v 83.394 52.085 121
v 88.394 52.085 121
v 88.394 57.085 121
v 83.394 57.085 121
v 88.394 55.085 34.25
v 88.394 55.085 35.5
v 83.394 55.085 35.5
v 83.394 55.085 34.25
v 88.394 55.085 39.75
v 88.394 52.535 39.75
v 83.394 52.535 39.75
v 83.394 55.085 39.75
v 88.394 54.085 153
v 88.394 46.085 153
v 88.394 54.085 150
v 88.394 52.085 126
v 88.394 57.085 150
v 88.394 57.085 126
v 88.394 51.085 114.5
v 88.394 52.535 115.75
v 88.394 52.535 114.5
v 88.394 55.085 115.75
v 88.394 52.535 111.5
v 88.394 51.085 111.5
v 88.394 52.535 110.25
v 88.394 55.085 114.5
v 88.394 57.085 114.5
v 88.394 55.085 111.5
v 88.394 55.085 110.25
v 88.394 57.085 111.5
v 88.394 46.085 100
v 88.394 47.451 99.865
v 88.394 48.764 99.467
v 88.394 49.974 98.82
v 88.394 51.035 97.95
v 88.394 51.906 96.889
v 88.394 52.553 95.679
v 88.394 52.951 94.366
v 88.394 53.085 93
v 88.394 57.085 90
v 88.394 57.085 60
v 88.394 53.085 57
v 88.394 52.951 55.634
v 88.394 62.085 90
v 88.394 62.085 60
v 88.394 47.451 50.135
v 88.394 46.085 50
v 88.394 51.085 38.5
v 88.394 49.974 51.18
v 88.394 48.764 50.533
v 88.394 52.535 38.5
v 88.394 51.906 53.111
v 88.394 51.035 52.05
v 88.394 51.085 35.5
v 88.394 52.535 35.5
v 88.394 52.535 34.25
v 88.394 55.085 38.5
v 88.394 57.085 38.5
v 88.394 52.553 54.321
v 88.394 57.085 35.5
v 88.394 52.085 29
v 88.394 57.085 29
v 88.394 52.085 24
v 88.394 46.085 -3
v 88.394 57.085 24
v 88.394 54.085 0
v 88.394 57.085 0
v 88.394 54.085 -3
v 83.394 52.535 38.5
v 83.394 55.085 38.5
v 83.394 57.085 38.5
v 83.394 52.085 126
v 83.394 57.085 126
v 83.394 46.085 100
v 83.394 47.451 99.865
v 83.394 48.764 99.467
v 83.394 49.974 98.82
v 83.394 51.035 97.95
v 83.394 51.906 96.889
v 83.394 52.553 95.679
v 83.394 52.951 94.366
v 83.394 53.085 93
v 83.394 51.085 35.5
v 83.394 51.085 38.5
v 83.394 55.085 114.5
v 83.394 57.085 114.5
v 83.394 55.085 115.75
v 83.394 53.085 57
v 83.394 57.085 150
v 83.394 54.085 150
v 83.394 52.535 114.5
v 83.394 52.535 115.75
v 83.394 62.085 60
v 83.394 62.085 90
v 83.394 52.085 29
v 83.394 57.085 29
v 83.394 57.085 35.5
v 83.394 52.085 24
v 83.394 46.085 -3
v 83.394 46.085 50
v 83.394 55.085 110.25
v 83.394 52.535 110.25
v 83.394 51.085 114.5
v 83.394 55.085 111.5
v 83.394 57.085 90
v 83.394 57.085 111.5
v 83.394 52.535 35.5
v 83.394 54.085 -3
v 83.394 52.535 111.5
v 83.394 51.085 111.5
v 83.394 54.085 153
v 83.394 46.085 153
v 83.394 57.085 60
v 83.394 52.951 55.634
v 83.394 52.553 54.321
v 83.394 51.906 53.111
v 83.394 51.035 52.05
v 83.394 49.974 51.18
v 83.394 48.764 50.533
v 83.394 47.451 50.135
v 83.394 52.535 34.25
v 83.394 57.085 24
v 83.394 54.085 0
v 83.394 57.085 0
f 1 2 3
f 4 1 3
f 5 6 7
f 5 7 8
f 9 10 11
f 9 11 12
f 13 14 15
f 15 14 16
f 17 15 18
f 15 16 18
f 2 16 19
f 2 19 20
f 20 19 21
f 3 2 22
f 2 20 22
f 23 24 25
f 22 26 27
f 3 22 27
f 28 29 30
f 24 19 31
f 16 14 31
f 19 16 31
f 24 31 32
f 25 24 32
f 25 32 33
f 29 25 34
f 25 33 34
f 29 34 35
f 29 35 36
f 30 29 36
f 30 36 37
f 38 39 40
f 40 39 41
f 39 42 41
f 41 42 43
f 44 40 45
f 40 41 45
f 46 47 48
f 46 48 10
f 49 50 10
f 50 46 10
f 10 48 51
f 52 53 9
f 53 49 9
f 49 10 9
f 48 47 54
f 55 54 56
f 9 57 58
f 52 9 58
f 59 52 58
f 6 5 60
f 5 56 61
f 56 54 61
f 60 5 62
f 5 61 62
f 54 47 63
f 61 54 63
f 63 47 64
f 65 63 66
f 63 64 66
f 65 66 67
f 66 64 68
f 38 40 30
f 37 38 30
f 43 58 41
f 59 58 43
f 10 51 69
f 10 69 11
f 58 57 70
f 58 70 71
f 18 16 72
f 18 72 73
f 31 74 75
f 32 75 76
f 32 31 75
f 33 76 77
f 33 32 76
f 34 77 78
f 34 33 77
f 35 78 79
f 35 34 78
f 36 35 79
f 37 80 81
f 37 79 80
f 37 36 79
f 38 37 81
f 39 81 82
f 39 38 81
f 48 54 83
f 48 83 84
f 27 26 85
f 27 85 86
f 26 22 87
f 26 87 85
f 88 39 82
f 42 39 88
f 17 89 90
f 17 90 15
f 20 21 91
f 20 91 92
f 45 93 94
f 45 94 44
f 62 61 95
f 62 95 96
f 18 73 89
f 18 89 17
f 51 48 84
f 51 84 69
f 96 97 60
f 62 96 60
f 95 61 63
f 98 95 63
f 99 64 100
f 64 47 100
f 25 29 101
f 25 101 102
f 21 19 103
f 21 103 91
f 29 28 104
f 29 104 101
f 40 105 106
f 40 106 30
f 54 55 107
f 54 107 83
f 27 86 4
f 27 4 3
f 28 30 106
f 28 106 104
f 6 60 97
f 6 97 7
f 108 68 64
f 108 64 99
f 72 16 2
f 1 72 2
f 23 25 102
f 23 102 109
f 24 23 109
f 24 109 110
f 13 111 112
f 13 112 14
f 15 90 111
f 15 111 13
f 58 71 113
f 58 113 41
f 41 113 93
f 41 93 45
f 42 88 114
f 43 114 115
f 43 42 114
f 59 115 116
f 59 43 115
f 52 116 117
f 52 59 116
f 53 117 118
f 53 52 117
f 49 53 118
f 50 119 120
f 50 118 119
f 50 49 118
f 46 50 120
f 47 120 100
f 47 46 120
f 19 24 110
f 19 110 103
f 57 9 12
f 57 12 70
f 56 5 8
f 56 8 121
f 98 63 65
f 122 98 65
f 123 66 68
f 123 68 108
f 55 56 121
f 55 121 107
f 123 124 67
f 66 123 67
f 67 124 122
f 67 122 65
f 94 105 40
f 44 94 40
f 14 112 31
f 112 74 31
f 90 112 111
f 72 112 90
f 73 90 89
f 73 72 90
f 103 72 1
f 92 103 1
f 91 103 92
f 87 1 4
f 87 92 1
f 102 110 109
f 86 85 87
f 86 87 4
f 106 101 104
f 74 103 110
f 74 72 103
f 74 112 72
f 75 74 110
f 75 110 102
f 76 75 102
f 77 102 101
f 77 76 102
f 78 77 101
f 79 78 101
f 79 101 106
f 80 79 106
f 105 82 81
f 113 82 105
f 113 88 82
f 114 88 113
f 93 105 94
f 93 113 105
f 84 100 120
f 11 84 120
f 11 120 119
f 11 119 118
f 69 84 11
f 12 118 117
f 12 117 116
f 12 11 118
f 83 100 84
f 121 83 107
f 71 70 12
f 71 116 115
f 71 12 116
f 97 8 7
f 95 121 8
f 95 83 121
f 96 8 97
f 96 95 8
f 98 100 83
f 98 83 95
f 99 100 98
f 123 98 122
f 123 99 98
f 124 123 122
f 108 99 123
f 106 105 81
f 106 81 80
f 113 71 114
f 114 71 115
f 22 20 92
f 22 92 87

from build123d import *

# Parameters (mm, degrees)
SKETCH1_W           = 5
SKETCH1_H           = 11
BOSS_EXTRUDE1_DEPTH = 150
CUT_EXTRUDE1_DEPTH  = 161.573187019
SKETCH3_W           = 5
SKETCH3_H           = 30
BOSS_EXTRUDE2_DEPTH = 5
CUT_EXTRUDE2_DEPTH  = 163.417988138
SKETCH6_W           = 5
SKETCH6_H           = 8
BOSS_EXTRUDE3_DEPTH = 3
SKETCH7_W           = 5
SKETCH7_H           = 8
BOSS_EXTRUDE4_DEPTH = 3
SKETCH8_W           = 5
SKETCH8_H           = 5
CUT_EXTRUDE3_DEPTH  = 166.192623536


with BuildPart() as part:
    # Sketch1 → Boss-Extrude1 (new body)
    with BuildSketch(Plane.XY):
        with Locations((85.894042166, 51.58544814)):
            Rectangle(SKETCH1_W, SKETCH1_H)
    extrude(amount=BOSS_EXTRUDE1_DEPTH)

    # Sketch2 → Cut-Extrude1 (cut, through all)
    with BuildSketch(Plane(origin=(88.394042166, 0, 0), x_dir=(0, 0, -1), z_dir=(1, 0, 0))):
        with BuildLine():
            Line((-93, 53.08544814), (-57, 53.08544814))
            ThreePointArc((-57, 53.08544814), (-52.050252532, 51.035195608), (-50, 46.08544814))
            Line((-50, 46.08544814), (-100, 46.08544814))
            ThreePointArc((-100, 46.08544814), (-97.949747468, 51.035195608), (-93, 53.08544814))
        make_face()
    extrude(amount=-CUT_EXTRUDE1_DEPTH, mode=Mode.SUBTRACT)

    # Sketch3 → Boss-Extrude2 (add)
    with BuildSketch(Plane(origin=(0, 57.08544814, 0), x_dir=(1, 0, 0), z_dir=(0, 1, 0))):
        with Locations((85.894042166, -75)):
            Rectangle(SKETCH3_W, SKETCH3_H)
    extrude(amount=BOSS_EXTRUDE2_DEPTH)

    # Sketch5 → Cut-Extrude2 (cut, through all)
    with BuildSketch(Plane(origin=(88.394042166, 0, 0), x_dir=(0, 0, -1), z_dir=(1, 0, 0))):
        Polygon((-35.5, 55.08544814), (-34.25, 55.08544814), (-34.25, 52.53544814), (-35.5, 52.53544814), (-35.5, 51.08544814), (-38.5, 51.08544814), (-38.5, 52.53544814), (-39.75, 52.53544814), (-39.75, 55.08544814), (-38.5, 55.08544814), (-38.5, 57.08544814), (-35.5, 57.08544814), align=None)
        Polygon((-114.5, 52.53544814), (-115.75, 52.53544814), (-115.75, 55.08544814), (-114.5, 55.08544814), (-114.5, 57.08544814), (-111.5, 57.08544814), (-111.5, 55.08544814), (-110.25, 55.08544814), (-110.25, 52.53544814), (-111.5, 52.53544814), (-111.5, 51.08544814), (-114.5, 51.08544814), align=None)
    extrude(amount=-CUT_EXTRUDE2_DEPTH, mode=Mode.SUBTRACT)

    # Sketch6 → Boss-Extrude3 (add)
    with BuildSketch(Plane(origin=(0, 0, 0), x_dir=(-1, 0, 0), z_dir=(0, 0, -1))):
        with Locations((-85.894042166, 50.08544814)):
            Rectangle(SKETCH6_W, SKETCH6_H)
    extrude(amount=BOSS_EXTRUDE3_DEPTH)

    # Sketch7 → Boss-Extrude4 (add)
    with BuildSketch(Plane.XY.offset(150)):
        with Locations((85.894042166, 50.08544814)):
            Rectangle(SKETCH7_W, SKETCH7_H)
    extrude(amount=BOSS_EXTRUDE4_DEPTH)

    # Sketch8 → Cut-Extrude3 (cut, through all)
    with BuildSketch(Plane(origin=(88.394042166, 0, 0), x_dir=(0, 0, -1), z_dir=(1, 0, 0))):
        with Locations((-123.5, 54.58544814)):
            Rectangle(SKETCH8_W, SKETCH8_H)
        with Locations((-26.5, 54.58544814)):
            Rectangle(SKETCH8_W, SKETCH8_H)
    extrude(amount=-CUT_EXTRUDE3_DEPTH, mode=Mode.SUBTRACT)


solid = part.part
